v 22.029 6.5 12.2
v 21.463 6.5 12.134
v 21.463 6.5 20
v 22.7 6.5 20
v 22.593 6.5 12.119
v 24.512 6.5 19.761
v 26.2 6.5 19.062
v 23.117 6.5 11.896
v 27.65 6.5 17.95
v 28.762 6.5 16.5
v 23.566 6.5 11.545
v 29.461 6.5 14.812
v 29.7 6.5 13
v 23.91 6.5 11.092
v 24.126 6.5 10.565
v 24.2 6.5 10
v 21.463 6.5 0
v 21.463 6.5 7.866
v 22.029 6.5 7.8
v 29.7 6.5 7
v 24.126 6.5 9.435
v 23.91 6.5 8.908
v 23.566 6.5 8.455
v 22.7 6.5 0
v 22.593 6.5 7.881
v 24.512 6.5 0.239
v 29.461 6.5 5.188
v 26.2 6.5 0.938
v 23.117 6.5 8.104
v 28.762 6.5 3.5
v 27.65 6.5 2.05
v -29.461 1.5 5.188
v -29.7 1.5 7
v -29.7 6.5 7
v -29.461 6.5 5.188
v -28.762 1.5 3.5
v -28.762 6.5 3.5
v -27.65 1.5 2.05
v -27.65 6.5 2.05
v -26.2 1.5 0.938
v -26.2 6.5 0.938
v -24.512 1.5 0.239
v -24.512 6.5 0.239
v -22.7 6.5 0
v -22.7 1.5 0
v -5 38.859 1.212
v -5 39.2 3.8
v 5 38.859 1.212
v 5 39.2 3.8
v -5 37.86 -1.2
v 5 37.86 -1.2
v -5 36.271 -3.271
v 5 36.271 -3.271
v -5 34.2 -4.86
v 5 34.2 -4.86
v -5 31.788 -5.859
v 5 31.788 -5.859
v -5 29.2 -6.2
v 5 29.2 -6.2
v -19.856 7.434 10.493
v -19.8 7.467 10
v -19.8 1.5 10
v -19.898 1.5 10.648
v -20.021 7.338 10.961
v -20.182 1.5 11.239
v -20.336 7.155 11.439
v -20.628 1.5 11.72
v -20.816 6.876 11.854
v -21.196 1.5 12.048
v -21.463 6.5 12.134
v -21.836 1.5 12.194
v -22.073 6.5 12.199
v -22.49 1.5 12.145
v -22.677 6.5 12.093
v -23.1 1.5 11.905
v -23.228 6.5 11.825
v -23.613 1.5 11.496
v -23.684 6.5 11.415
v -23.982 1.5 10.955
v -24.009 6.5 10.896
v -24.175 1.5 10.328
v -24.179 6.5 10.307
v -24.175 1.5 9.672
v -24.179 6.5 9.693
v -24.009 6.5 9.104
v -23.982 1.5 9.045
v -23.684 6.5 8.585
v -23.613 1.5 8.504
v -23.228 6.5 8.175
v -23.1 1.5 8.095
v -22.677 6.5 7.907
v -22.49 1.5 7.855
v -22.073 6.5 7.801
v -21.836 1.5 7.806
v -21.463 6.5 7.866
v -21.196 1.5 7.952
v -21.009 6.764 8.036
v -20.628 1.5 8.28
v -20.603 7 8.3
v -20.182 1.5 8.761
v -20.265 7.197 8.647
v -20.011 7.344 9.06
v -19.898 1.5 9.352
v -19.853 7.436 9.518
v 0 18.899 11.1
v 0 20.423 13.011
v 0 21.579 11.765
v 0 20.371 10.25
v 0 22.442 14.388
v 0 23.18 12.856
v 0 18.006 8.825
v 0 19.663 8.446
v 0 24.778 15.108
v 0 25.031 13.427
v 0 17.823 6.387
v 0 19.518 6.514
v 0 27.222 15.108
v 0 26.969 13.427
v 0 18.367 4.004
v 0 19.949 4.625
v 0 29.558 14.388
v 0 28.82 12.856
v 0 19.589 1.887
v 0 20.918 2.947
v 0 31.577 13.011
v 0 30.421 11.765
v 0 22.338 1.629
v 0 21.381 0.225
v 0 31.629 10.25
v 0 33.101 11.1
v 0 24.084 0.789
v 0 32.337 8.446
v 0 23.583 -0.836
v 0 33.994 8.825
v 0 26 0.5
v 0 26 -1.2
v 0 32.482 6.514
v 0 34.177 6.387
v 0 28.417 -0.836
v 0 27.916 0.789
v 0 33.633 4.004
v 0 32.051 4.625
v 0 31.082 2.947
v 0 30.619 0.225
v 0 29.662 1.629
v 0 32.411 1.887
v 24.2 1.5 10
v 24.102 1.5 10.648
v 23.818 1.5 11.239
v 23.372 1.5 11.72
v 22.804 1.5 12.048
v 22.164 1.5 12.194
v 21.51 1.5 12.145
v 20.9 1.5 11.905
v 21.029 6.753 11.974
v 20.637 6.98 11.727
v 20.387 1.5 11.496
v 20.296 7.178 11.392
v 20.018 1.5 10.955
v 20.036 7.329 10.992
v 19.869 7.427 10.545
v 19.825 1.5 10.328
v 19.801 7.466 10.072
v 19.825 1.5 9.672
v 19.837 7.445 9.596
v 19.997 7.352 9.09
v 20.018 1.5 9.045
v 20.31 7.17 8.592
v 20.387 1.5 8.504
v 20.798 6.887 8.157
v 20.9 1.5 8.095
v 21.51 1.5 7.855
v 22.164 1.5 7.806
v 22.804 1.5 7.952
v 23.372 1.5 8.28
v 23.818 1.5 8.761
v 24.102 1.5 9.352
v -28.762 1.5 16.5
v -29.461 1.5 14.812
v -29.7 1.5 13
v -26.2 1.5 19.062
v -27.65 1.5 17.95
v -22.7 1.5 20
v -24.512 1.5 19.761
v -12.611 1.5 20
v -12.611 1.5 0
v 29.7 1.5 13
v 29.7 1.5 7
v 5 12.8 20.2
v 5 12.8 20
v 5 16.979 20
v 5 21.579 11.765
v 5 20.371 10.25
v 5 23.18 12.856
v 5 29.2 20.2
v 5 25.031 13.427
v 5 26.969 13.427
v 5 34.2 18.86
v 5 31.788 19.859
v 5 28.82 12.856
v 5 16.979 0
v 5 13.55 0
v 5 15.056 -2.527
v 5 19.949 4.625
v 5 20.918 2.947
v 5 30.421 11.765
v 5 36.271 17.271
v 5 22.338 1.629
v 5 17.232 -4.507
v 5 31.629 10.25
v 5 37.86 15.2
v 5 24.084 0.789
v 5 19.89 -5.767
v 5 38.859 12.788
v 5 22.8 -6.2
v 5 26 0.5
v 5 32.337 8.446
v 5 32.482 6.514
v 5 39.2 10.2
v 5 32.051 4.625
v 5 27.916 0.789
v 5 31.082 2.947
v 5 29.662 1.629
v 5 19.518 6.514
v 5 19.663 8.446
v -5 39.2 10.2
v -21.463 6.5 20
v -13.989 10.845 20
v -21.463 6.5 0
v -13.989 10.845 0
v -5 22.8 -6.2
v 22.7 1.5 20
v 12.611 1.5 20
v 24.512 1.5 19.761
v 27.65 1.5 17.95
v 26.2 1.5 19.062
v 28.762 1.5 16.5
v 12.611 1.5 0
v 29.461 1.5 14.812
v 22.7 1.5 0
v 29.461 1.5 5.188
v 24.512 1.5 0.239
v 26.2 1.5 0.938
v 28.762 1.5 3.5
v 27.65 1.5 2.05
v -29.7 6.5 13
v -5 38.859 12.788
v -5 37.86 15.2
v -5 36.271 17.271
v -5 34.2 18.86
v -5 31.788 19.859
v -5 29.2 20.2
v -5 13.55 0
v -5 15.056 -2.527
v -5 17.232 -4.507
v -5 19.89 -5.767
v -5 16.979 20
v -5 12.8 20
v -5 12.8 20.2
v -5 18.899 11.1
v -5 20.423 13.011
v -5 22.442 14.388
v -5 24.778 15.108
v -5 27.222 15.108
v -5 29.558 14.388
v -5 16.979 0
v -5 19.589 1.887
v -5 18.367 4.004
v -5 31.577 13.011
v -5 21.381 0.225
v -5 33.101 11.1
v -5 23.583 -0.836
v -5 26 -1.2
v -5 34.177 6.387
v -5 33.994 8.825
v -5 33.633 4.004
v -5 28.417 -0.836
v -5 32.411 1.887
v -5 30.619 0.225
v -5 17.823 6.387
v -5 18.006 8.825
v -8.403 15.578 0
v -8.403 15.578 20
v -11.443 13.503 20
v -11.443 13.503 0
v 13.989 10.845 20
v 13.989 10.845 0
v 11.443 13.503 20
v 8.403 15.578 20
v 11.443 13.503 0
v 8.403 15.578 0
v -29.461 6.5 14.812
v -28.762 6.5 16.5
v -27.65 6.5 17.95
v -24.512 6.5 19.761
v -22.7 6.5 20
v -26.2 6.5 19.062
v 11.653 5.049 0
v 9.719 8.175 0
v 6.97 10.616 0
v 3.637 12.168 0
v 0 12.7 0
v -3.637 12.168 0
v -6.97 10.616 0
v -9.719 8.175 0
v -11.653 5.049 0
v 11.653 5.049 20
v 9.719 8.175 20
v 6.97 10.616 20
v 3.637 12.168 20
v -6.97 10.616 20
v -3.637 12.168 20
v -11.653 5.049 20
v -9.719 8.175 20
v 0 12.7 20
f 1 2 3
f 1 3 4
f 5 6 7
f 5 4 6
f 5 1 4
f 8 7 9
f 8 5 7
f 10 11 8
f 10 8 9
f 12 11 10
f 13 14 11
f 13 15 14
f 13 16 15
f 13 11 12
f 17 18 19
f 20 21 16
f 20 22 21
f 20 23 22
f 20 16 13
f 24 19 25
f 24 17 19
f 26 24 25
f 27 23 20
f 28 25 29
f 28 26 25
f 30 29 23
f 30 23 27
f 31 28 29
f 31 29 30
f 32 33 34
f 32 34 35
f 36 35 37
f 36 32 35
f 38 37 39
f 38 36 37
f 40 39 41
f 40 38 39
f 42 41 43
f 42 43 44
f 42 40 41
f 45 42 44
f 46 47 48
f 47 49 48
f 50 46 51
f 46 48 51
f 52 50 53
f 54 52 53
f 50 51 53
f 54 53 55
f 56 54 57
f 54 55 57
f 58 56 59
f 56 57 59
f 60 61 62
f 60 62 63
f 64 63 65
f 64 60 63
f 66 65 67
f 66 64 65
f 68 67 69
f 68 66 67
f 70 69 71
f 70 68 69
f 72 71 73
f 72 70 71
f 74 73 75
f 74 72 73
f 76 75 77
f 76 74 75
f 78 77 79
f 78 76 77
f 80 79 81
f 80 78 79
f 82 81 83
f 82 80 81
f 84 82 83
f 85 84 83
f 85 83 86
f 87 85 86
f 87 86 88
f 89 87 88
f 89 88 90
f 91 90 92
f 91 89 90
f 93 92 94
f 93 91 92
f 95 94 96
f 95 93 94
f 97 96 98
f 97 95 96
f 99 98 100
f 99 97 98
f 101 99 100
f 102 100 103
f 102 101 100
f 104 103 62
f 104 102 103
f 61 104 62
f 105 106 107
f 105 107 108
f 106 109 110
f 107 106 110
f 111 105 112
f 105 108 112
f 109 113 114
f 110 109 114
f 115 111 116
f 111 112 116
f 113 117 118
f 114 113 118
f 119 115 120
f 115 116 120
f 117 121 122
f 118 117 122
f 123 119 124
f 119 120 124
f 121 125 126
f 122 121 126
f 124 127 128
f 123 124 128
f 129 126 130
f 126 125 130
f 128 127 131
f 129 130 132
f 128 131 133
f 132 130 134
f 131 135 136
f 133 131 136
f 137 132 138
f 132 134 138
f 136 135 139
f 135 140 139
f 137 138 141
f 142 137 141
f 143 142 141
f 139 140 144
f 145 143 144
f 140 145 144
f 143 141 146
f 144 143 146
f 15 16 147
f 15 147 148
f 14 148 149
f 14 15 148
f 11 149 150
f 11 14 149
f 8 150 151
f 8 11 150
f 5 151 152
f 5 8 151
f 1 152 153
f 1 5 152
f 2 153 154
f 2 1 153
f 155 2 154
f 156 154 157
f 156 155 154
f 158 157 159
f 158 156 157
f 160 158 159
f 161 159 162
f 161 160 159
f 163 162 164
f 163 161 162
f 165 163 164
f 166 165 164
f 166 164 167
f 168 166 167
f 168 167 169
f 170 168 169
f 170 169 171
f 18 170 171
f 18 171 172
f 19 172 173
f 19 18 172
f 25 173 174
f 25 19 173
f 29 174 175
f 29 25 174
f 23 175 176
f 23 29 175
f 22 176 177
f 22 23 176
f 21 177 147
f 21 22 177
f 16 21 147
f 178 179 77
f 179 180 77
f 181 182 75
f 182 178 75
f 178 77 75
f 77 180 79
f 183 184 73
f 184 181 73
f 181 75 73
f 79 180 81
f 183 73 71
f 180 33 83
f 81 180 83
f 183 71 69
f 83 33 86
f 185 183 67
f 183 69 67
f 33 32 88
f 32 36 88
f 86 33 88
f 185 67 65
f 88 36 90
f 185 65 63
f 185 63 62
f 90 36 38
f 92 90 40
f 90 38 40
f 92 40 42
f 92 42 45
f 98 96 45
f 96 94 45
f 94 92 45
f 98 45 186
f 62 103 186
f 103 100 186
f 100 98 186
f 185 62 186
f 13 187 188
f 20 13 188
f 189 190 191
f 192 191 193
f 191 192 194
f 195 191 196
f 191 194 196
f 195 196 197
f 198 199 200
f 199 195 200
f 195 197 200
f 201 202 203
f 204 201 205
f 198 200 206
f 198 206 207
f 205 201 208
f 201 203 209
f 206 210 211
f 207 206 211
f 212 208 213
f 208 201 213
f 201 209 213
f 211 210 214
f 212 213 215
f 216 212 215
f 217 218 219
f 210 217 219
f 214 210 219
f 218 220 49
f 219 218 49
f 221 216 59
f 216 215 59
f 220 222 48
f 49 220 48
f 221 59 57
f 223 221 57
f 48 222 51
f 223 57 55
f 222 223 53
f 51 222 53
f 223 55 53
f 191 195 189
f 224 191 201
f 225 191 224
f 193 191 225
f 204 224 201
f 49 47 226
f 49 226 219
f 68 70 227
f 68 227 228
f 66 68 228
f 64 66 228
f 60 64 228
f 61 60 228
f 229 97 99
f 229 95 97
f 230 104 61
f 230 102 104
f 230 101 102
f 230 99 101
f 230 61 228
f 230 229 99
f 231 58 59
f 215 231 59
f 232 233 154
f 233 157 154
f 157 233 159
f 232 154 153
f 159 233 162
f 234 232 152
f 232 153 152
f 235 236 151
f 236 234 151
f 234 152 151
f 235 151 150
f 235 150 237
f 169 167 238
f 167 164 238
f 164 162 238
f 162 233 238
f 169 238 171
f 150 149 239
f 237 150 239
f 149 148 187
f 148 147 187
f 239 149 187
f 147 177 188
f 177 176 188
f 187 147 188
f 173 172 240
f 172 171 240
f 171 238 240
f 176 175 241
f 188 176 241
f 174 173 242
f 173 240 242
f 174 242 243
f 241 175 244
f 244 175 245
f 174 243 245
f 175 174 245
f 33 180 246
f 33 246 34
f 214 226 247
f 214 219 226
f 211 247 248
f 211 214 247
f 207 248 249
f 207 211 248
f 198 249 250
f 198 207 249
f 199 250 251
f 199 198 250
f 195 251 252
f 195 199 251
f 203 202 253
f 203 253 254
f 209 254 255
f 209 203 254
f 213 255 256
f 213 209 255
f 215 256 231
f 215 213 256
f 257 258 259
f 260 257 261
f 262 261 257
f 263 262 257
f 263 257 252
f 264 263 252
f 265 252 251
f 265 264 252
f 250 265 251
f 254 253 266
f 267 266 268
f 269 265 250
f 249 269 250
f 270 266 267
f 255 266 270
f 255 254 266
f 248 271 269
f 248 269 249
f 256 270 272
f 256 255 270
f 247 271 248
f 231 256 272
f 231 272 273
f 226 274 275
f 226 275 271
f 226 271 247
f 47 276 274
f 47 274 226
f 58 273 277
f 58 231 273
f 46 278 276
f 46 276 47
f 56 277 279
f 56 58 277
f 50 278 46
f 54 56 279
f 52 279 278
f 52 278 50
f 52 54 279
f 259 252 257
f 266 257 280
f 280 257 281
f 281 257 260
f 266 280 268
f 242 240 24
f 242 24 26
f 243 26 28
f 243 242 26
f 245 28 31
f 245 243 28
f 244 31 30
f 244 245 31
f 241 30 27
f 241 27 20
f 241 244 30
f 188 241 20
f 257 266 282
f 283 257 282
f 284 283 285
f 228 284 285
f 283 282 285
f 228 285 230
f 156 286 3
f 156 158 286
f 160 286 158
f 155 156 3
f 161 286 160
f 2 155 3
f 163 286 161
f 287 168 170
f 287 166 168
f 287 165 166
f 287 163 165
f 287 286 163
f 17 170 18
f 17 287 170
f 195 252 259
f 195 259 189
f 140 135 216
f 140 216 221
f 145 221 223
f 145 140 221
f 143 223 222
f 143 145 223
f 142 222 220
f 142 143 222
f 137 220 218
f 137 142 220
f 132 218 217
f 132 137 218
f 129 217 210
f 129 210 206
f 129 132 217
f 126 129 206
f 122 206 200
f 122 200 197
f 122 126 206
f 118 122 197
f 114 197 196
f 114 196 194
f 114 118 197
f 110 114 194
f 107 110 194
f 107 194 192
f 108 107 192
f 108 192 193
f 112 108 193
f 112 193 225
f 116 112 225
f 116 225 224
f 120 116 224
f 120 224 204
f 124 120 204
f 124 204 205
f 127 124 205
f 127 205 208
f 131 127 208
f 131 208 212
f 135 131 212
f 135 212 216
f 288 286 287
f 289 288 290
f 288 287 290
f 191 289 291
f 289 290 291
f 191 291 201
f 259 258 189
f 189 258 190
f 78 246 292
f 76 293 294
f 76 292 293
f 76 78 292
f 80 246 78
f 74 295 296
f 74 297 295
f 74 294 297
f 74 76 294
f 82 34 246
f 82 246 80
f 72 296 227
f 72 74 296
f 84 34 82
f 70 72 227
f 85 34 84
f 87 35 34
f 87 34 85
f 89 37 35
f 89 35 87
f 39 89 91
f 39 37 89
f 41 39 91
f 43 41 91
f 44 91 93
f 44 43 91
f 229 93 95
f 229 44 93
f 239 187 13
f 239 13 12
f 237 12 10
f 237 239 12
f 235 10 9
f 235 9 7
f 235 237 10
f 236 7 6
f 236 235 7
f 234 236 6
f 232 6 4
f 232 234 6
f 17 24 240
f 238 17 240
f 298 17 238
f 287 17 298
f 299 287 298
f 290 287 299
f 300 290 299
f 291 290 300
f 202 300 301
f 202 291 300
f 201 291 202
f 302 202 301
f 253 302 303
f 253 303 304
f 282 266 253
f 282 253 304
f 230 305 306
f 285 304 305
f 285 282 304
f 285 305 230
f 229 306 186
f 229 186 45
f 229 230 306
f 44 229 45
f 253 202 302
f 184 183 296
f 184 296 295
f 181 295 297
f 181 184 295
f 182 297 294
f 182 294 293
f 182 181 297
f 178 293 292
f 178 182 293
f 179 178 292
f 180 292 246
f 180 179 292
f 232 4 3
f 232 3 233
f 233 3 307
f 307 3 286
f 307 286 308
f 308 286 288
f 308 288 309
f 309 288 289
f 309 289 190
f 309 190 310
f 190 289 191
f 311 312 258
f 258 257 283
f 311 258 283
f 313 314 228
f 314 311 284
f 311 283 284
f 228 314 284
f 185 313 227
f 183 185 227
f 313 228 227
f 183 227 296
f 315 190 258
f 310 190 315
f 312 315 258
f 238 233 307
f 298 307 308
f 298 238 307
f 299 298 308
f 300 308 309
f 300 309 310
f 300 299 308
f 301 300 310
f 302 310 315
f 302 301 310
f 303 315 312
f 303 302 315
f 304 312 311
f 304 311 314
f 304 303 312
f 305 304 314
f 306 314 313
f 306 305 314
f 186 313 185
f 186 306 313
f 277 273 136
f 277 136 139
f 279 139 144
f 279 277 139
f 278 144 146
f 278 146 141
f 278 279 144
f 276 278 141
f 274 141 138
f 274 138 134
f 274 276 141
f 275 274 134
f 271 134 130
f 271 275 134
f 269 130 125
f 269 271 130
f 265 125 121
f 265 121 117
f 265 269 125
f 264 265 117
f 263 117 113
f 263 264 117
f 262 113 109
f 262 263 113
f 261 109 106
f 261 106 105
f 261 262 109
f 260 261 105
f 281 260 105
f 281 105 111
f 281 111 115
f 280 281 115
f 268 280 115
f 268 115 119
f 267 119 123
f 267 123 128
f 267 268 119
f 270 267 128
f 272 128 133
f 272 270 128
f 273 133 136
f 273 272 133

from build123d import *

# Parameters (mm, degrees)
CYLINDER005_R     = 6.5
CYLINDER005_DEPTH = 10
CYLINDER004_R     = 8.2
CYLINDER004_DEPTH = 5
BOX_W             = 10
BOX_H             = 26.4
BOX_DEPTH         = 26.4
FILLET_R          = 10
CYLINDER002_R     = 2.2
CYLINDER002_DEPTH = 20
ARRAY001_X_COUNT  = 2
ARRAY001_X_PITCH  = 44
PAD_DEPTH         = 20
PAD001_DEPTH      = 5


with BuildPart() as bring_holder_hole:
    # Cylinder005 → Cylinder005 (new body)
    with BuildSketch(Plane(origin=(0, 0, 0), x_dir=(0, 0, -1), z_dir=(1, 0, 0))):
        Circle(CYLINDER005_R)
    extrude(amount=CYLINDER005_DEPTH)


with BuildPart() as bring_holder_extract:
    # Cylinder004 → Cylinder004 (new body)
    with BuildSketch(Plane(origin=(0, 0, 0), x_dir=(0, 0, -1), z_dir=(1, 0, 0))):
        Circle(CYLINDER004_R)
    extrude(amount=CYLINDER004_DEPTH)

    # Fusion001: union bring holder hole
    add(bring_holder_hole.part)


with BuildPart() as bring_holder_cut:
    # Box → Box (new body)
    with BuildSketch(Plane(origin=(0, -13.2, -13.2), x_dir=(1, 0, 0), z_dir=(0, 0, 1))):
        with Locations((5, 13.2)):
            Rectangle(BOX_W, BOX_H)
    extrude(amount=BOX_DEPTH)

    # Fillet
    fillet_edges = [bring_holder_cut.edges().sort_by_distance(p)[0] for p in [
        (5, -13.2, -13.2),
        (5, 13.2, -13.2),
        (5, 13.2, 13.2),
    ]]
    fillet(fillet_edges, radius=FILLET_R)

    # Cut023015003: cut bring holder extract
    add(bring_holder_extract.part, mode=Mode.SUBTRACT)


with BuildPart() as bring_holder_cut_1:
    # Cut023015003 placement: moved
    add(bring_holder_cut.part.moved(Location((-5, 26, 7))))


with BuildPart() as bolt_hole_array001:
    # Cylinder002 → Cylinder002 (new body)
    with BuildSketch(Plane.XZ):
        Circle(CYLINDER002_R)
    extrude(amount=CYLINDER002_DEPTH)

    # Array001 X: bolt hole array001 ×2


with BuildPart() as bolt_hole_array001_1:
    add(bolt_hole_array001.part)
    with Locations(*[(i * ARRAY001_X_PITCH, 0, 0) for i in range(1, ARRAY001_X_COUNT)]):
        add(bolt_hole_array001.part)


with BuildPart() as bolt_hole_array001_2:
    # Array001 placement: moved
    add(bolt_hole_array001_1.part.moved(Location((-22, 20, 10))))


with BuildPart() as f_25_mm_16mm_bring_attachment_fusion:
    # Sketch → Pad (new body)
    with BuildSketch(Plane.XY):
        with BuildLine():
            ThreePointArc((12.611106, 1.5), (0, 12.7), (-12.611106, 1.5))
            Line((-22.7, 1.5), (-12.611106, 1.5))
            Line((-22.7, 1.5), (-22.7, 6.5))
            Line((-22.7, 6.5), (-21.463293, 6.5))
            Line((-21.463293, 6.5), (-13.988671, 10.84468))
            ThreePointArc((13.988671, 10.84468), (0, 17.7), (-13.988671, 10.84468))
            Line((13.988671, 10.84468), (21.463293, 6.5))
            Line((21.463293, 6.5), (22.7, 6.5))
            Line((22.7, 6.5), (22.7, 1.5))
            Line((12.611106, 1.5), (22.7, 1.5))
        make_face()
    extrude(amount=PAD_DEPTH)

    # Sketch001 → Pad001 (join)
    with BuildSketch(Plane.XZ.offset(-1.5)):
        with BuildLine():
            Line((-12.611106, 20), (-22.7, 20))
            ThreePointArc((-22.7, 20), (-27.649747, 17.949747), (-29.7, 13))
            Line((-29.7, 13), (-29.7, 7))
            ThreePointArc((-29.7, 7), (-27.649747, 2.050253), (-22.7, 0))
            Line((-12.611106, 0), (-22.7, 0))
            Line((-12.611106, 20), (-12.611106, 0))
        make_face()
        with BuildLine():
            Line((12.611106, 20), (22.7, 20))
            ThreePointArc((29.7, 13), (27.649747, 17.949747), (22.7, 20))
            Line((29.7, 13), (29.7, 7))
            ThreePointArc((22.7, 0), (27.649747, 2.050253), (29.7, 7))
            Line((22.7, 0), (12.611106, 0))
            Line((12.611106, 20), (12.611106, 0))
        make_face()
    extrude(amount=-PAD001_DEPTH)

    # Cut023015002: cut bolt hole array001
    add(bolt_hole_array001_2.part, mode=Mode.SUBTRACT)

    # Fusion002: union bring holder cut
    add(bring_holder_cut_1.part)


solid = f_25_mm_16mm_bring_attachment_fusion.part
